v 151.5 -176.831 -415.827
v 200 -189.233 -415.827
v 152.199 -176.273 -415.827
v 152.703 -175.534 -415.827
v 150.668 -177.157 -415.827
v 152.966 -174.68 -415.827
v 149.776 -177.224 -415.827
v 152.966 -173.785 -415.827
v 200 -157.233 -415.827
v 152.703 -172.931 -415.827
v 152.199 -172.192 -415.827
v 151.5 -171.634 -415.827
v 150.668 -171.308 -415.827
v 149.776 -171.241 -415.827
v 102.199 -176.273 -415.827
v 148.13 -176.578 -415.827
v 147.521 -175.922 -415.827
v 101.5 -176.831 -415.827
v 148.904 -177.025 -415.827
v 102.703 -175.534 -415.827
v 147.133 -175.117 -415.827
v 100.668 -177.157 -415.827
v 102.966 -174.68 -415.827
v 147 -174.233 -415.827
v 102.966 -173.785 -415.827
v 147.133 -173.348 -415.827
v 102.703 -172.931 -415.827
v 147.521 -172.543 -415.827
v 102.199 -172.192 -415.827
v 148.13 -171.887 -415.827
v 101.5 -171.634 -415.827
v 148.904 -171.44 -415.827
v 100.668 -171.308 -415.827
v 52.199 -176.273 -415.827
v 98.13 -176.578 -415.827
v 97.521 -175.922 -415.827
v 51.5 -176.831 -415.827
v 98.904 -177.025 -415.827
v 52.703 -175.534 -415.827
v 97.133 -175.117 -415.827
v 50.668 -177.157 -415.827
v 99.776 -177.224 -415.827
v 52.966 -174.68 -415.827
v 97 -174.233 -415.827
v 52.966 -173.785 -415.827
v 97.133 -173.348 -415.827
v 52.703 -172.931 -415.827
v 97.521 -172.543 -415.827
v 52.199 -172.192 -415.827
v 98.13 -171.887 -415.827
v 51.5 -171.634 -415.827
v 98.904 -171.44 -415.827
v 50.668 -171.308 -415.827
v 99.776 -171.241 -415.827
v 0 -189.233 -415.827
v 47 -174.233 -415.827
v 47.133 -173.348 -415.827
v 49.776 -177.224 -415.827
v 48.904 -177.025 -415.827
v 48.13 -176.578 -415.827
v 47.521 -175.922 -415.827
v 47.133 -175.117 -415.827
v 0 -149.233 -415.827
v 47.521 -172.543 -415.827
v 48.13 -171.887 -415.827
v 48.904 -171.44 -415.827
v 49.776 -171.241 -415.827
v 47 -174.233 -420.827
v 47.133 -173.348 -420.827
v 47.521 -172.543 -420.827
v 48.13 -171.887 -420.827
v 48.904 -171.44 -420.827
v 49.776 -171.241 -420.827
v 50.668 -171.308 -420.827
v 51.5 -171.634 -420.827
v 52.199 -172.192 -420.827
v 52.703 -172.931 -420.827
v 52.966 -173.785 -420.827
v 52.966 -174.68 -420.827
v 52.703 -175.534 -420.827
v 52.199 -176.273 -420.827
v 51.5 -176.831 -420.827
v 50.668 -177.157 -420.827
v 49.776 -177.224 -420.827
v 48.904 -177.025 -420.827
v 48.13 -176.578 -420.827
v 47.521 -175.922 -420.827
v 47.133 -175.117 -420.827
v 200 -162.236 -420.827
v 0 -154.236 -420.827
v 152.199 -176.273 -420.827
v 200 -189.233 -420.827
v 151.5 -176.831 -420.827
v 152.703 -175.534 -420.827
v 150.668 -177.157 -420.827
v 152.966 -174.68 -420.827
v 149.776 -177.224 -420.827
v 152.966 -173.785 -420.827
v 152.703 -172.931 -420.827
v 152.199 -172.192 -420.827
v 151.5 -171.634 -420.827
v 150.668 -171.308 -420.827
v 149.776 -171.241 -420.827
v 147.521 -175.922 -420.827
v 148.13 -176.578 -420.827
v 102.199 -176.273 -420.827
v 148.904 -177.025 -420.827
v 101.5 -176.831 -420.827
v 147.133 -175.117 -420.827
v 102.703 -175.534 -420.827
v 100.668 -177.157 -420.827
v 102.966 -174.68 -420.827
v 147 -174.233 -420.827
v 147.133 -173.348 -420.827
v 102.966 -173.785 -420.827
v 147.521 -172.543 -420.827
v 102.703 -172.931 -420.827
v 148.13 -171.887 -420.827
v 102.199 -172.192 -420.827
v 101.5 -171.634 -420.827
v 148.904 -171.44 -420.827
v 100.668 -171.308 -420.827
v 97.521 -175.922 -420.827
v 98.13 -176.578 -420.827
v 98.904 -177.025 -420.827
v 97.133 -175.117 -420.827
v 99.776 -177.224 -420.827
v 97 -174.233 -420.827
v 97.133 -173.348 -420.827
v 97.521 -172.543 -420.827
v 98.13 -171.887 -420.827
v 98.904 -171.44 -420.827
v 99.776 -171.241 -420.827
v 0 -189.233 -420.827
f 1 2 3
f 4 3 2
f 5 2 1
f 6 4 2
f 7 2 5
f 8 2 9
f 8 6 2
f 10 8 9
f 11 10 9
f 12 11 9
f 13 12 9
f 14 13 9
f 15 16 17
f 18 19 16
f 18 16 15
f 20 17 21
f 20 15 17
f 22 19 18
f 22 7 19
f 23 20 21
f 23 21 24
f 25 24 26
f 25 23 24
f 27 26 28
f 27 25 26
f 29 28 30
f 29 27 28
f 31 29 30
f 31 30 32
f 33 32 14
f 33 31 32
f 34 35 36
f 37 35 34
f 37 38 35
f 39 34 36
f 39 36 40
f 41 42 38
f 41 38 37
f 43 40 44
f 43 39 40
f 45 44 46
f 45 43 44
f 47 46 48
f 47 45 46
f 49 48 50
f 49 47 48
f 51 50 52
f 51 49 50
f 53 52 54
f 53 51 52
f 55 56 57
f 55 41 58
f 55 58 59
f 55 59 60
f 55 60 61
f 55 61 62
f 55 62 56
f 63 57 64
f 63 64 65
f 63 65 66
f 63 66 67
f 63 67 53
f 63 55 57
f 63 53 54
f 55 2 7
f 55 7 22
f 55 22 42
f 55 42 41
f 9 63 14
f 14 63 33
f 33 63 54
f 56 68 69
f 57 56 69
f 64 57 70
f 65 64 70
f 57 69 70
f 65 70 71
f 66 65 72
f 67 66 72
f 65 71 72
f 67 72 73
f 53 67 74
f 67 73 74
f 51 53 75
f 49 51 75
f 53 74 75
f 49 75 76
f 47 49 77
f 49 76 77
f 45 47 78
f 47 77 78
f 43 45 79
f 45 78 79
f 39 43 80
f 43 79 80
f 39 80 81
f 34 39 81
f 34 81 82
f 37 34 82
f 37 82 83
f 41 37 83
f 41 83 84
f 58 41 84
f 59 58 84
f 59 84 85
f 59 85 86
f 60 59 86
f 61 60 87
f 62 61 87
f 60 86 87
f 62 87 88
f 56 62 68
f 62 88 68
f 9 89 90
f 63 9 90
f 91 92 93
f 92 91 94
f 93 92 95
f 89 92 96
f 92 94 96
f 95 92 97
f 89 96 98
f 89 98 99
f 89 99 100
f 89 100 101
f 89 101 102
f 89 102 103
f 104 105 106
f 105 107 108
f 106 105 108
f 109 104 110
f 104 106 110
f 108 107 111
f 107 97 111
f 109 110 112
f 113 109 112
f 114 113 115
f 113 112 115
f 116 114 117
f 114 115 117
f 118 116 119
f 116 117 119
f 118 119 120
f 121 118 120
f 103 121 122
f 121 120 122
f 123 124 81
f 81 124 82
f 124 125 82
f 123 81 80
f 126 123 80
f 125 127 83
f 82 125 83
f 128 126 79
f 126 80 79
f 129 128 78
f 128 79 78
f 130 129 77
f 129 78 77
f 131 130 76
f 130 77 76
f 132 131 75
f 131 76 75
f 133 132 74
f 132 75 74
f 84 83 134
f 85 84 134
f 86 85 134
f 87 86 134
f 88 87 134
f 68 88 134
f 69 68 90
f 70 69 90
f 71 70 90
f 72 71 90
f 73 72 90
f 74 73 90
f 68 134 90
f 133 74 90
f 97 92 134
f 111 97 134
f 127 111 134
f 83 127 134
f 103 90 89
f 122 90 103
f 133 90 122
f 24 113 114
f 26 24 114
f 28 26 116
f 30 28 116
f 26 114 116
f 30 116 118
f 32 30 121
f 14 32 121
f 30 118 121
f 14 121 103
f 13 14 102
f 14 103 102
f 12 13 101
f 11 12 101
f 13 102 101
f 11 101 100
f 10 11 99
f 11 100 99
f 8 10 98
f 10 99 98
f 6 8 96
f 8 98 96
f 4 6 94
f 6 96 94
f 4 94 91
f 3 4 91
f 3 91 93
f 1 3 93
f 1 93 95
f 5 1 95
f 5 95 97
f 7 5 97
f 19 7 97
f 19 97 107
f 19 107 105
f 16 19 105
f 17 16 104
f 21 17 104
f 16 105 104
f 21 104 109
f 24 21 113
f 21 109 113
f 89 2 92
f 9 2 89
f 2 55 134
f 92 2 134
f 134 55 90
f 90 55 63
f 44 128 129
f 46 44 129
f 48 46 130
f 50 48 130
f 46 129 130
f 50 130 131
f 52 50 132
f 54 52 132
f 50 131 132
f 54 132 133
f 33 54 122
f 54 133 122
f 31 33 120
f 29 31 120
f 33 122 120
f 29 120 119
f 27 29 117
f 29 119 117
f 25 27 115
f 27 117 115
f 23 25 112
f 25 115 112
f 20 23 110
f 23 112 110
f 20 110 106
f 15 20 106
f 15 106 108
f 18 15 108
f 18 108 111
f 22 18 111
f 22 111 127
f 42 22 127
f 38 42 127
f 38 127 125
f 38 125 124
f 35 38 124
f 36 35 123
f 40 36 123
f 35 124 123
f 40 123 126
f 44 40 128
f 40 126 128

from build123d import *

# Parameters (mm, degrees)
SKETCH1_W           = 5
SKETCH1_H           = 40
BOSS_EXTRUDE1_DEPTH = 200
CUT_EXTRUDE2_DEPTH  = 5
CHAMFER1_SIZE       = 5
SKETCH2_R           = 3
CUT_EXTRUDE1_DEPTH  = 5
LPATTERN1_COUNT     = 3
LPATTERN1_PITCH     = 50


with BuildPart() as part:
    # Sketch1 → Boss-Extrude1 (new body)
    with BuildSketch(Plane(origin=(0, 0, 0), x_dir=(0, 0, -1), z_dir=(1, 0, 0))):
        with Locations((418.326871087, -169.232517464)):
            Rectangle(SKETCH1_W, SKETCH1_H)
    extrude(amount=BOSS_EXTRUDE1_DEPTH)

    # Sketch3 → Cut-Extrude2 (cut)
    with BuildSketch(Plane.XY.offset(-415.826871087)):
        Polygon((0, -149.232517464), (200, -149.232517464), (200, -157.232517464), align=None)
    extrude(amount=-CUT_EXTRUDE2_DEPTH, mode=Mode.SUBTRACT)

    # Chamfer1
    chamfer1_edges = [part.edges().sort_by_distance(p)[0] for p in [
        (100, -153.232517464, -420.826871087),
    ]]
    chamfer(chamfer1_edges, length=CHAMFER1_SIZE - 0.0001)  # a hair under: the kernel refuses the full size

    # Sketch2 → Cut-Extrude1 (cut)
    with BuildSketch(Plane(origin=(0, 0, -420.826871087), x_dir=(-1, 0, 0), z_dir=(0, 0, -1))):
        with Locations((-50, -174.232517464)):
            Circle(SKETCH2_R)
    cut_extrude1 = extrude(amount=-CUT_EXTRUDE1_DEPTH, mode=Mode.SUBTRACT)

    # LPattern1: Cut-Extrude1 ×3
    with Locations(*[(i * LPATTERN1_PITCH, 0, 0) for i in range(1, LPATTERN1_COUNT)]):
        add(cut_extrude1, mode=Mode.SUBTRACT)


solid = part.part
